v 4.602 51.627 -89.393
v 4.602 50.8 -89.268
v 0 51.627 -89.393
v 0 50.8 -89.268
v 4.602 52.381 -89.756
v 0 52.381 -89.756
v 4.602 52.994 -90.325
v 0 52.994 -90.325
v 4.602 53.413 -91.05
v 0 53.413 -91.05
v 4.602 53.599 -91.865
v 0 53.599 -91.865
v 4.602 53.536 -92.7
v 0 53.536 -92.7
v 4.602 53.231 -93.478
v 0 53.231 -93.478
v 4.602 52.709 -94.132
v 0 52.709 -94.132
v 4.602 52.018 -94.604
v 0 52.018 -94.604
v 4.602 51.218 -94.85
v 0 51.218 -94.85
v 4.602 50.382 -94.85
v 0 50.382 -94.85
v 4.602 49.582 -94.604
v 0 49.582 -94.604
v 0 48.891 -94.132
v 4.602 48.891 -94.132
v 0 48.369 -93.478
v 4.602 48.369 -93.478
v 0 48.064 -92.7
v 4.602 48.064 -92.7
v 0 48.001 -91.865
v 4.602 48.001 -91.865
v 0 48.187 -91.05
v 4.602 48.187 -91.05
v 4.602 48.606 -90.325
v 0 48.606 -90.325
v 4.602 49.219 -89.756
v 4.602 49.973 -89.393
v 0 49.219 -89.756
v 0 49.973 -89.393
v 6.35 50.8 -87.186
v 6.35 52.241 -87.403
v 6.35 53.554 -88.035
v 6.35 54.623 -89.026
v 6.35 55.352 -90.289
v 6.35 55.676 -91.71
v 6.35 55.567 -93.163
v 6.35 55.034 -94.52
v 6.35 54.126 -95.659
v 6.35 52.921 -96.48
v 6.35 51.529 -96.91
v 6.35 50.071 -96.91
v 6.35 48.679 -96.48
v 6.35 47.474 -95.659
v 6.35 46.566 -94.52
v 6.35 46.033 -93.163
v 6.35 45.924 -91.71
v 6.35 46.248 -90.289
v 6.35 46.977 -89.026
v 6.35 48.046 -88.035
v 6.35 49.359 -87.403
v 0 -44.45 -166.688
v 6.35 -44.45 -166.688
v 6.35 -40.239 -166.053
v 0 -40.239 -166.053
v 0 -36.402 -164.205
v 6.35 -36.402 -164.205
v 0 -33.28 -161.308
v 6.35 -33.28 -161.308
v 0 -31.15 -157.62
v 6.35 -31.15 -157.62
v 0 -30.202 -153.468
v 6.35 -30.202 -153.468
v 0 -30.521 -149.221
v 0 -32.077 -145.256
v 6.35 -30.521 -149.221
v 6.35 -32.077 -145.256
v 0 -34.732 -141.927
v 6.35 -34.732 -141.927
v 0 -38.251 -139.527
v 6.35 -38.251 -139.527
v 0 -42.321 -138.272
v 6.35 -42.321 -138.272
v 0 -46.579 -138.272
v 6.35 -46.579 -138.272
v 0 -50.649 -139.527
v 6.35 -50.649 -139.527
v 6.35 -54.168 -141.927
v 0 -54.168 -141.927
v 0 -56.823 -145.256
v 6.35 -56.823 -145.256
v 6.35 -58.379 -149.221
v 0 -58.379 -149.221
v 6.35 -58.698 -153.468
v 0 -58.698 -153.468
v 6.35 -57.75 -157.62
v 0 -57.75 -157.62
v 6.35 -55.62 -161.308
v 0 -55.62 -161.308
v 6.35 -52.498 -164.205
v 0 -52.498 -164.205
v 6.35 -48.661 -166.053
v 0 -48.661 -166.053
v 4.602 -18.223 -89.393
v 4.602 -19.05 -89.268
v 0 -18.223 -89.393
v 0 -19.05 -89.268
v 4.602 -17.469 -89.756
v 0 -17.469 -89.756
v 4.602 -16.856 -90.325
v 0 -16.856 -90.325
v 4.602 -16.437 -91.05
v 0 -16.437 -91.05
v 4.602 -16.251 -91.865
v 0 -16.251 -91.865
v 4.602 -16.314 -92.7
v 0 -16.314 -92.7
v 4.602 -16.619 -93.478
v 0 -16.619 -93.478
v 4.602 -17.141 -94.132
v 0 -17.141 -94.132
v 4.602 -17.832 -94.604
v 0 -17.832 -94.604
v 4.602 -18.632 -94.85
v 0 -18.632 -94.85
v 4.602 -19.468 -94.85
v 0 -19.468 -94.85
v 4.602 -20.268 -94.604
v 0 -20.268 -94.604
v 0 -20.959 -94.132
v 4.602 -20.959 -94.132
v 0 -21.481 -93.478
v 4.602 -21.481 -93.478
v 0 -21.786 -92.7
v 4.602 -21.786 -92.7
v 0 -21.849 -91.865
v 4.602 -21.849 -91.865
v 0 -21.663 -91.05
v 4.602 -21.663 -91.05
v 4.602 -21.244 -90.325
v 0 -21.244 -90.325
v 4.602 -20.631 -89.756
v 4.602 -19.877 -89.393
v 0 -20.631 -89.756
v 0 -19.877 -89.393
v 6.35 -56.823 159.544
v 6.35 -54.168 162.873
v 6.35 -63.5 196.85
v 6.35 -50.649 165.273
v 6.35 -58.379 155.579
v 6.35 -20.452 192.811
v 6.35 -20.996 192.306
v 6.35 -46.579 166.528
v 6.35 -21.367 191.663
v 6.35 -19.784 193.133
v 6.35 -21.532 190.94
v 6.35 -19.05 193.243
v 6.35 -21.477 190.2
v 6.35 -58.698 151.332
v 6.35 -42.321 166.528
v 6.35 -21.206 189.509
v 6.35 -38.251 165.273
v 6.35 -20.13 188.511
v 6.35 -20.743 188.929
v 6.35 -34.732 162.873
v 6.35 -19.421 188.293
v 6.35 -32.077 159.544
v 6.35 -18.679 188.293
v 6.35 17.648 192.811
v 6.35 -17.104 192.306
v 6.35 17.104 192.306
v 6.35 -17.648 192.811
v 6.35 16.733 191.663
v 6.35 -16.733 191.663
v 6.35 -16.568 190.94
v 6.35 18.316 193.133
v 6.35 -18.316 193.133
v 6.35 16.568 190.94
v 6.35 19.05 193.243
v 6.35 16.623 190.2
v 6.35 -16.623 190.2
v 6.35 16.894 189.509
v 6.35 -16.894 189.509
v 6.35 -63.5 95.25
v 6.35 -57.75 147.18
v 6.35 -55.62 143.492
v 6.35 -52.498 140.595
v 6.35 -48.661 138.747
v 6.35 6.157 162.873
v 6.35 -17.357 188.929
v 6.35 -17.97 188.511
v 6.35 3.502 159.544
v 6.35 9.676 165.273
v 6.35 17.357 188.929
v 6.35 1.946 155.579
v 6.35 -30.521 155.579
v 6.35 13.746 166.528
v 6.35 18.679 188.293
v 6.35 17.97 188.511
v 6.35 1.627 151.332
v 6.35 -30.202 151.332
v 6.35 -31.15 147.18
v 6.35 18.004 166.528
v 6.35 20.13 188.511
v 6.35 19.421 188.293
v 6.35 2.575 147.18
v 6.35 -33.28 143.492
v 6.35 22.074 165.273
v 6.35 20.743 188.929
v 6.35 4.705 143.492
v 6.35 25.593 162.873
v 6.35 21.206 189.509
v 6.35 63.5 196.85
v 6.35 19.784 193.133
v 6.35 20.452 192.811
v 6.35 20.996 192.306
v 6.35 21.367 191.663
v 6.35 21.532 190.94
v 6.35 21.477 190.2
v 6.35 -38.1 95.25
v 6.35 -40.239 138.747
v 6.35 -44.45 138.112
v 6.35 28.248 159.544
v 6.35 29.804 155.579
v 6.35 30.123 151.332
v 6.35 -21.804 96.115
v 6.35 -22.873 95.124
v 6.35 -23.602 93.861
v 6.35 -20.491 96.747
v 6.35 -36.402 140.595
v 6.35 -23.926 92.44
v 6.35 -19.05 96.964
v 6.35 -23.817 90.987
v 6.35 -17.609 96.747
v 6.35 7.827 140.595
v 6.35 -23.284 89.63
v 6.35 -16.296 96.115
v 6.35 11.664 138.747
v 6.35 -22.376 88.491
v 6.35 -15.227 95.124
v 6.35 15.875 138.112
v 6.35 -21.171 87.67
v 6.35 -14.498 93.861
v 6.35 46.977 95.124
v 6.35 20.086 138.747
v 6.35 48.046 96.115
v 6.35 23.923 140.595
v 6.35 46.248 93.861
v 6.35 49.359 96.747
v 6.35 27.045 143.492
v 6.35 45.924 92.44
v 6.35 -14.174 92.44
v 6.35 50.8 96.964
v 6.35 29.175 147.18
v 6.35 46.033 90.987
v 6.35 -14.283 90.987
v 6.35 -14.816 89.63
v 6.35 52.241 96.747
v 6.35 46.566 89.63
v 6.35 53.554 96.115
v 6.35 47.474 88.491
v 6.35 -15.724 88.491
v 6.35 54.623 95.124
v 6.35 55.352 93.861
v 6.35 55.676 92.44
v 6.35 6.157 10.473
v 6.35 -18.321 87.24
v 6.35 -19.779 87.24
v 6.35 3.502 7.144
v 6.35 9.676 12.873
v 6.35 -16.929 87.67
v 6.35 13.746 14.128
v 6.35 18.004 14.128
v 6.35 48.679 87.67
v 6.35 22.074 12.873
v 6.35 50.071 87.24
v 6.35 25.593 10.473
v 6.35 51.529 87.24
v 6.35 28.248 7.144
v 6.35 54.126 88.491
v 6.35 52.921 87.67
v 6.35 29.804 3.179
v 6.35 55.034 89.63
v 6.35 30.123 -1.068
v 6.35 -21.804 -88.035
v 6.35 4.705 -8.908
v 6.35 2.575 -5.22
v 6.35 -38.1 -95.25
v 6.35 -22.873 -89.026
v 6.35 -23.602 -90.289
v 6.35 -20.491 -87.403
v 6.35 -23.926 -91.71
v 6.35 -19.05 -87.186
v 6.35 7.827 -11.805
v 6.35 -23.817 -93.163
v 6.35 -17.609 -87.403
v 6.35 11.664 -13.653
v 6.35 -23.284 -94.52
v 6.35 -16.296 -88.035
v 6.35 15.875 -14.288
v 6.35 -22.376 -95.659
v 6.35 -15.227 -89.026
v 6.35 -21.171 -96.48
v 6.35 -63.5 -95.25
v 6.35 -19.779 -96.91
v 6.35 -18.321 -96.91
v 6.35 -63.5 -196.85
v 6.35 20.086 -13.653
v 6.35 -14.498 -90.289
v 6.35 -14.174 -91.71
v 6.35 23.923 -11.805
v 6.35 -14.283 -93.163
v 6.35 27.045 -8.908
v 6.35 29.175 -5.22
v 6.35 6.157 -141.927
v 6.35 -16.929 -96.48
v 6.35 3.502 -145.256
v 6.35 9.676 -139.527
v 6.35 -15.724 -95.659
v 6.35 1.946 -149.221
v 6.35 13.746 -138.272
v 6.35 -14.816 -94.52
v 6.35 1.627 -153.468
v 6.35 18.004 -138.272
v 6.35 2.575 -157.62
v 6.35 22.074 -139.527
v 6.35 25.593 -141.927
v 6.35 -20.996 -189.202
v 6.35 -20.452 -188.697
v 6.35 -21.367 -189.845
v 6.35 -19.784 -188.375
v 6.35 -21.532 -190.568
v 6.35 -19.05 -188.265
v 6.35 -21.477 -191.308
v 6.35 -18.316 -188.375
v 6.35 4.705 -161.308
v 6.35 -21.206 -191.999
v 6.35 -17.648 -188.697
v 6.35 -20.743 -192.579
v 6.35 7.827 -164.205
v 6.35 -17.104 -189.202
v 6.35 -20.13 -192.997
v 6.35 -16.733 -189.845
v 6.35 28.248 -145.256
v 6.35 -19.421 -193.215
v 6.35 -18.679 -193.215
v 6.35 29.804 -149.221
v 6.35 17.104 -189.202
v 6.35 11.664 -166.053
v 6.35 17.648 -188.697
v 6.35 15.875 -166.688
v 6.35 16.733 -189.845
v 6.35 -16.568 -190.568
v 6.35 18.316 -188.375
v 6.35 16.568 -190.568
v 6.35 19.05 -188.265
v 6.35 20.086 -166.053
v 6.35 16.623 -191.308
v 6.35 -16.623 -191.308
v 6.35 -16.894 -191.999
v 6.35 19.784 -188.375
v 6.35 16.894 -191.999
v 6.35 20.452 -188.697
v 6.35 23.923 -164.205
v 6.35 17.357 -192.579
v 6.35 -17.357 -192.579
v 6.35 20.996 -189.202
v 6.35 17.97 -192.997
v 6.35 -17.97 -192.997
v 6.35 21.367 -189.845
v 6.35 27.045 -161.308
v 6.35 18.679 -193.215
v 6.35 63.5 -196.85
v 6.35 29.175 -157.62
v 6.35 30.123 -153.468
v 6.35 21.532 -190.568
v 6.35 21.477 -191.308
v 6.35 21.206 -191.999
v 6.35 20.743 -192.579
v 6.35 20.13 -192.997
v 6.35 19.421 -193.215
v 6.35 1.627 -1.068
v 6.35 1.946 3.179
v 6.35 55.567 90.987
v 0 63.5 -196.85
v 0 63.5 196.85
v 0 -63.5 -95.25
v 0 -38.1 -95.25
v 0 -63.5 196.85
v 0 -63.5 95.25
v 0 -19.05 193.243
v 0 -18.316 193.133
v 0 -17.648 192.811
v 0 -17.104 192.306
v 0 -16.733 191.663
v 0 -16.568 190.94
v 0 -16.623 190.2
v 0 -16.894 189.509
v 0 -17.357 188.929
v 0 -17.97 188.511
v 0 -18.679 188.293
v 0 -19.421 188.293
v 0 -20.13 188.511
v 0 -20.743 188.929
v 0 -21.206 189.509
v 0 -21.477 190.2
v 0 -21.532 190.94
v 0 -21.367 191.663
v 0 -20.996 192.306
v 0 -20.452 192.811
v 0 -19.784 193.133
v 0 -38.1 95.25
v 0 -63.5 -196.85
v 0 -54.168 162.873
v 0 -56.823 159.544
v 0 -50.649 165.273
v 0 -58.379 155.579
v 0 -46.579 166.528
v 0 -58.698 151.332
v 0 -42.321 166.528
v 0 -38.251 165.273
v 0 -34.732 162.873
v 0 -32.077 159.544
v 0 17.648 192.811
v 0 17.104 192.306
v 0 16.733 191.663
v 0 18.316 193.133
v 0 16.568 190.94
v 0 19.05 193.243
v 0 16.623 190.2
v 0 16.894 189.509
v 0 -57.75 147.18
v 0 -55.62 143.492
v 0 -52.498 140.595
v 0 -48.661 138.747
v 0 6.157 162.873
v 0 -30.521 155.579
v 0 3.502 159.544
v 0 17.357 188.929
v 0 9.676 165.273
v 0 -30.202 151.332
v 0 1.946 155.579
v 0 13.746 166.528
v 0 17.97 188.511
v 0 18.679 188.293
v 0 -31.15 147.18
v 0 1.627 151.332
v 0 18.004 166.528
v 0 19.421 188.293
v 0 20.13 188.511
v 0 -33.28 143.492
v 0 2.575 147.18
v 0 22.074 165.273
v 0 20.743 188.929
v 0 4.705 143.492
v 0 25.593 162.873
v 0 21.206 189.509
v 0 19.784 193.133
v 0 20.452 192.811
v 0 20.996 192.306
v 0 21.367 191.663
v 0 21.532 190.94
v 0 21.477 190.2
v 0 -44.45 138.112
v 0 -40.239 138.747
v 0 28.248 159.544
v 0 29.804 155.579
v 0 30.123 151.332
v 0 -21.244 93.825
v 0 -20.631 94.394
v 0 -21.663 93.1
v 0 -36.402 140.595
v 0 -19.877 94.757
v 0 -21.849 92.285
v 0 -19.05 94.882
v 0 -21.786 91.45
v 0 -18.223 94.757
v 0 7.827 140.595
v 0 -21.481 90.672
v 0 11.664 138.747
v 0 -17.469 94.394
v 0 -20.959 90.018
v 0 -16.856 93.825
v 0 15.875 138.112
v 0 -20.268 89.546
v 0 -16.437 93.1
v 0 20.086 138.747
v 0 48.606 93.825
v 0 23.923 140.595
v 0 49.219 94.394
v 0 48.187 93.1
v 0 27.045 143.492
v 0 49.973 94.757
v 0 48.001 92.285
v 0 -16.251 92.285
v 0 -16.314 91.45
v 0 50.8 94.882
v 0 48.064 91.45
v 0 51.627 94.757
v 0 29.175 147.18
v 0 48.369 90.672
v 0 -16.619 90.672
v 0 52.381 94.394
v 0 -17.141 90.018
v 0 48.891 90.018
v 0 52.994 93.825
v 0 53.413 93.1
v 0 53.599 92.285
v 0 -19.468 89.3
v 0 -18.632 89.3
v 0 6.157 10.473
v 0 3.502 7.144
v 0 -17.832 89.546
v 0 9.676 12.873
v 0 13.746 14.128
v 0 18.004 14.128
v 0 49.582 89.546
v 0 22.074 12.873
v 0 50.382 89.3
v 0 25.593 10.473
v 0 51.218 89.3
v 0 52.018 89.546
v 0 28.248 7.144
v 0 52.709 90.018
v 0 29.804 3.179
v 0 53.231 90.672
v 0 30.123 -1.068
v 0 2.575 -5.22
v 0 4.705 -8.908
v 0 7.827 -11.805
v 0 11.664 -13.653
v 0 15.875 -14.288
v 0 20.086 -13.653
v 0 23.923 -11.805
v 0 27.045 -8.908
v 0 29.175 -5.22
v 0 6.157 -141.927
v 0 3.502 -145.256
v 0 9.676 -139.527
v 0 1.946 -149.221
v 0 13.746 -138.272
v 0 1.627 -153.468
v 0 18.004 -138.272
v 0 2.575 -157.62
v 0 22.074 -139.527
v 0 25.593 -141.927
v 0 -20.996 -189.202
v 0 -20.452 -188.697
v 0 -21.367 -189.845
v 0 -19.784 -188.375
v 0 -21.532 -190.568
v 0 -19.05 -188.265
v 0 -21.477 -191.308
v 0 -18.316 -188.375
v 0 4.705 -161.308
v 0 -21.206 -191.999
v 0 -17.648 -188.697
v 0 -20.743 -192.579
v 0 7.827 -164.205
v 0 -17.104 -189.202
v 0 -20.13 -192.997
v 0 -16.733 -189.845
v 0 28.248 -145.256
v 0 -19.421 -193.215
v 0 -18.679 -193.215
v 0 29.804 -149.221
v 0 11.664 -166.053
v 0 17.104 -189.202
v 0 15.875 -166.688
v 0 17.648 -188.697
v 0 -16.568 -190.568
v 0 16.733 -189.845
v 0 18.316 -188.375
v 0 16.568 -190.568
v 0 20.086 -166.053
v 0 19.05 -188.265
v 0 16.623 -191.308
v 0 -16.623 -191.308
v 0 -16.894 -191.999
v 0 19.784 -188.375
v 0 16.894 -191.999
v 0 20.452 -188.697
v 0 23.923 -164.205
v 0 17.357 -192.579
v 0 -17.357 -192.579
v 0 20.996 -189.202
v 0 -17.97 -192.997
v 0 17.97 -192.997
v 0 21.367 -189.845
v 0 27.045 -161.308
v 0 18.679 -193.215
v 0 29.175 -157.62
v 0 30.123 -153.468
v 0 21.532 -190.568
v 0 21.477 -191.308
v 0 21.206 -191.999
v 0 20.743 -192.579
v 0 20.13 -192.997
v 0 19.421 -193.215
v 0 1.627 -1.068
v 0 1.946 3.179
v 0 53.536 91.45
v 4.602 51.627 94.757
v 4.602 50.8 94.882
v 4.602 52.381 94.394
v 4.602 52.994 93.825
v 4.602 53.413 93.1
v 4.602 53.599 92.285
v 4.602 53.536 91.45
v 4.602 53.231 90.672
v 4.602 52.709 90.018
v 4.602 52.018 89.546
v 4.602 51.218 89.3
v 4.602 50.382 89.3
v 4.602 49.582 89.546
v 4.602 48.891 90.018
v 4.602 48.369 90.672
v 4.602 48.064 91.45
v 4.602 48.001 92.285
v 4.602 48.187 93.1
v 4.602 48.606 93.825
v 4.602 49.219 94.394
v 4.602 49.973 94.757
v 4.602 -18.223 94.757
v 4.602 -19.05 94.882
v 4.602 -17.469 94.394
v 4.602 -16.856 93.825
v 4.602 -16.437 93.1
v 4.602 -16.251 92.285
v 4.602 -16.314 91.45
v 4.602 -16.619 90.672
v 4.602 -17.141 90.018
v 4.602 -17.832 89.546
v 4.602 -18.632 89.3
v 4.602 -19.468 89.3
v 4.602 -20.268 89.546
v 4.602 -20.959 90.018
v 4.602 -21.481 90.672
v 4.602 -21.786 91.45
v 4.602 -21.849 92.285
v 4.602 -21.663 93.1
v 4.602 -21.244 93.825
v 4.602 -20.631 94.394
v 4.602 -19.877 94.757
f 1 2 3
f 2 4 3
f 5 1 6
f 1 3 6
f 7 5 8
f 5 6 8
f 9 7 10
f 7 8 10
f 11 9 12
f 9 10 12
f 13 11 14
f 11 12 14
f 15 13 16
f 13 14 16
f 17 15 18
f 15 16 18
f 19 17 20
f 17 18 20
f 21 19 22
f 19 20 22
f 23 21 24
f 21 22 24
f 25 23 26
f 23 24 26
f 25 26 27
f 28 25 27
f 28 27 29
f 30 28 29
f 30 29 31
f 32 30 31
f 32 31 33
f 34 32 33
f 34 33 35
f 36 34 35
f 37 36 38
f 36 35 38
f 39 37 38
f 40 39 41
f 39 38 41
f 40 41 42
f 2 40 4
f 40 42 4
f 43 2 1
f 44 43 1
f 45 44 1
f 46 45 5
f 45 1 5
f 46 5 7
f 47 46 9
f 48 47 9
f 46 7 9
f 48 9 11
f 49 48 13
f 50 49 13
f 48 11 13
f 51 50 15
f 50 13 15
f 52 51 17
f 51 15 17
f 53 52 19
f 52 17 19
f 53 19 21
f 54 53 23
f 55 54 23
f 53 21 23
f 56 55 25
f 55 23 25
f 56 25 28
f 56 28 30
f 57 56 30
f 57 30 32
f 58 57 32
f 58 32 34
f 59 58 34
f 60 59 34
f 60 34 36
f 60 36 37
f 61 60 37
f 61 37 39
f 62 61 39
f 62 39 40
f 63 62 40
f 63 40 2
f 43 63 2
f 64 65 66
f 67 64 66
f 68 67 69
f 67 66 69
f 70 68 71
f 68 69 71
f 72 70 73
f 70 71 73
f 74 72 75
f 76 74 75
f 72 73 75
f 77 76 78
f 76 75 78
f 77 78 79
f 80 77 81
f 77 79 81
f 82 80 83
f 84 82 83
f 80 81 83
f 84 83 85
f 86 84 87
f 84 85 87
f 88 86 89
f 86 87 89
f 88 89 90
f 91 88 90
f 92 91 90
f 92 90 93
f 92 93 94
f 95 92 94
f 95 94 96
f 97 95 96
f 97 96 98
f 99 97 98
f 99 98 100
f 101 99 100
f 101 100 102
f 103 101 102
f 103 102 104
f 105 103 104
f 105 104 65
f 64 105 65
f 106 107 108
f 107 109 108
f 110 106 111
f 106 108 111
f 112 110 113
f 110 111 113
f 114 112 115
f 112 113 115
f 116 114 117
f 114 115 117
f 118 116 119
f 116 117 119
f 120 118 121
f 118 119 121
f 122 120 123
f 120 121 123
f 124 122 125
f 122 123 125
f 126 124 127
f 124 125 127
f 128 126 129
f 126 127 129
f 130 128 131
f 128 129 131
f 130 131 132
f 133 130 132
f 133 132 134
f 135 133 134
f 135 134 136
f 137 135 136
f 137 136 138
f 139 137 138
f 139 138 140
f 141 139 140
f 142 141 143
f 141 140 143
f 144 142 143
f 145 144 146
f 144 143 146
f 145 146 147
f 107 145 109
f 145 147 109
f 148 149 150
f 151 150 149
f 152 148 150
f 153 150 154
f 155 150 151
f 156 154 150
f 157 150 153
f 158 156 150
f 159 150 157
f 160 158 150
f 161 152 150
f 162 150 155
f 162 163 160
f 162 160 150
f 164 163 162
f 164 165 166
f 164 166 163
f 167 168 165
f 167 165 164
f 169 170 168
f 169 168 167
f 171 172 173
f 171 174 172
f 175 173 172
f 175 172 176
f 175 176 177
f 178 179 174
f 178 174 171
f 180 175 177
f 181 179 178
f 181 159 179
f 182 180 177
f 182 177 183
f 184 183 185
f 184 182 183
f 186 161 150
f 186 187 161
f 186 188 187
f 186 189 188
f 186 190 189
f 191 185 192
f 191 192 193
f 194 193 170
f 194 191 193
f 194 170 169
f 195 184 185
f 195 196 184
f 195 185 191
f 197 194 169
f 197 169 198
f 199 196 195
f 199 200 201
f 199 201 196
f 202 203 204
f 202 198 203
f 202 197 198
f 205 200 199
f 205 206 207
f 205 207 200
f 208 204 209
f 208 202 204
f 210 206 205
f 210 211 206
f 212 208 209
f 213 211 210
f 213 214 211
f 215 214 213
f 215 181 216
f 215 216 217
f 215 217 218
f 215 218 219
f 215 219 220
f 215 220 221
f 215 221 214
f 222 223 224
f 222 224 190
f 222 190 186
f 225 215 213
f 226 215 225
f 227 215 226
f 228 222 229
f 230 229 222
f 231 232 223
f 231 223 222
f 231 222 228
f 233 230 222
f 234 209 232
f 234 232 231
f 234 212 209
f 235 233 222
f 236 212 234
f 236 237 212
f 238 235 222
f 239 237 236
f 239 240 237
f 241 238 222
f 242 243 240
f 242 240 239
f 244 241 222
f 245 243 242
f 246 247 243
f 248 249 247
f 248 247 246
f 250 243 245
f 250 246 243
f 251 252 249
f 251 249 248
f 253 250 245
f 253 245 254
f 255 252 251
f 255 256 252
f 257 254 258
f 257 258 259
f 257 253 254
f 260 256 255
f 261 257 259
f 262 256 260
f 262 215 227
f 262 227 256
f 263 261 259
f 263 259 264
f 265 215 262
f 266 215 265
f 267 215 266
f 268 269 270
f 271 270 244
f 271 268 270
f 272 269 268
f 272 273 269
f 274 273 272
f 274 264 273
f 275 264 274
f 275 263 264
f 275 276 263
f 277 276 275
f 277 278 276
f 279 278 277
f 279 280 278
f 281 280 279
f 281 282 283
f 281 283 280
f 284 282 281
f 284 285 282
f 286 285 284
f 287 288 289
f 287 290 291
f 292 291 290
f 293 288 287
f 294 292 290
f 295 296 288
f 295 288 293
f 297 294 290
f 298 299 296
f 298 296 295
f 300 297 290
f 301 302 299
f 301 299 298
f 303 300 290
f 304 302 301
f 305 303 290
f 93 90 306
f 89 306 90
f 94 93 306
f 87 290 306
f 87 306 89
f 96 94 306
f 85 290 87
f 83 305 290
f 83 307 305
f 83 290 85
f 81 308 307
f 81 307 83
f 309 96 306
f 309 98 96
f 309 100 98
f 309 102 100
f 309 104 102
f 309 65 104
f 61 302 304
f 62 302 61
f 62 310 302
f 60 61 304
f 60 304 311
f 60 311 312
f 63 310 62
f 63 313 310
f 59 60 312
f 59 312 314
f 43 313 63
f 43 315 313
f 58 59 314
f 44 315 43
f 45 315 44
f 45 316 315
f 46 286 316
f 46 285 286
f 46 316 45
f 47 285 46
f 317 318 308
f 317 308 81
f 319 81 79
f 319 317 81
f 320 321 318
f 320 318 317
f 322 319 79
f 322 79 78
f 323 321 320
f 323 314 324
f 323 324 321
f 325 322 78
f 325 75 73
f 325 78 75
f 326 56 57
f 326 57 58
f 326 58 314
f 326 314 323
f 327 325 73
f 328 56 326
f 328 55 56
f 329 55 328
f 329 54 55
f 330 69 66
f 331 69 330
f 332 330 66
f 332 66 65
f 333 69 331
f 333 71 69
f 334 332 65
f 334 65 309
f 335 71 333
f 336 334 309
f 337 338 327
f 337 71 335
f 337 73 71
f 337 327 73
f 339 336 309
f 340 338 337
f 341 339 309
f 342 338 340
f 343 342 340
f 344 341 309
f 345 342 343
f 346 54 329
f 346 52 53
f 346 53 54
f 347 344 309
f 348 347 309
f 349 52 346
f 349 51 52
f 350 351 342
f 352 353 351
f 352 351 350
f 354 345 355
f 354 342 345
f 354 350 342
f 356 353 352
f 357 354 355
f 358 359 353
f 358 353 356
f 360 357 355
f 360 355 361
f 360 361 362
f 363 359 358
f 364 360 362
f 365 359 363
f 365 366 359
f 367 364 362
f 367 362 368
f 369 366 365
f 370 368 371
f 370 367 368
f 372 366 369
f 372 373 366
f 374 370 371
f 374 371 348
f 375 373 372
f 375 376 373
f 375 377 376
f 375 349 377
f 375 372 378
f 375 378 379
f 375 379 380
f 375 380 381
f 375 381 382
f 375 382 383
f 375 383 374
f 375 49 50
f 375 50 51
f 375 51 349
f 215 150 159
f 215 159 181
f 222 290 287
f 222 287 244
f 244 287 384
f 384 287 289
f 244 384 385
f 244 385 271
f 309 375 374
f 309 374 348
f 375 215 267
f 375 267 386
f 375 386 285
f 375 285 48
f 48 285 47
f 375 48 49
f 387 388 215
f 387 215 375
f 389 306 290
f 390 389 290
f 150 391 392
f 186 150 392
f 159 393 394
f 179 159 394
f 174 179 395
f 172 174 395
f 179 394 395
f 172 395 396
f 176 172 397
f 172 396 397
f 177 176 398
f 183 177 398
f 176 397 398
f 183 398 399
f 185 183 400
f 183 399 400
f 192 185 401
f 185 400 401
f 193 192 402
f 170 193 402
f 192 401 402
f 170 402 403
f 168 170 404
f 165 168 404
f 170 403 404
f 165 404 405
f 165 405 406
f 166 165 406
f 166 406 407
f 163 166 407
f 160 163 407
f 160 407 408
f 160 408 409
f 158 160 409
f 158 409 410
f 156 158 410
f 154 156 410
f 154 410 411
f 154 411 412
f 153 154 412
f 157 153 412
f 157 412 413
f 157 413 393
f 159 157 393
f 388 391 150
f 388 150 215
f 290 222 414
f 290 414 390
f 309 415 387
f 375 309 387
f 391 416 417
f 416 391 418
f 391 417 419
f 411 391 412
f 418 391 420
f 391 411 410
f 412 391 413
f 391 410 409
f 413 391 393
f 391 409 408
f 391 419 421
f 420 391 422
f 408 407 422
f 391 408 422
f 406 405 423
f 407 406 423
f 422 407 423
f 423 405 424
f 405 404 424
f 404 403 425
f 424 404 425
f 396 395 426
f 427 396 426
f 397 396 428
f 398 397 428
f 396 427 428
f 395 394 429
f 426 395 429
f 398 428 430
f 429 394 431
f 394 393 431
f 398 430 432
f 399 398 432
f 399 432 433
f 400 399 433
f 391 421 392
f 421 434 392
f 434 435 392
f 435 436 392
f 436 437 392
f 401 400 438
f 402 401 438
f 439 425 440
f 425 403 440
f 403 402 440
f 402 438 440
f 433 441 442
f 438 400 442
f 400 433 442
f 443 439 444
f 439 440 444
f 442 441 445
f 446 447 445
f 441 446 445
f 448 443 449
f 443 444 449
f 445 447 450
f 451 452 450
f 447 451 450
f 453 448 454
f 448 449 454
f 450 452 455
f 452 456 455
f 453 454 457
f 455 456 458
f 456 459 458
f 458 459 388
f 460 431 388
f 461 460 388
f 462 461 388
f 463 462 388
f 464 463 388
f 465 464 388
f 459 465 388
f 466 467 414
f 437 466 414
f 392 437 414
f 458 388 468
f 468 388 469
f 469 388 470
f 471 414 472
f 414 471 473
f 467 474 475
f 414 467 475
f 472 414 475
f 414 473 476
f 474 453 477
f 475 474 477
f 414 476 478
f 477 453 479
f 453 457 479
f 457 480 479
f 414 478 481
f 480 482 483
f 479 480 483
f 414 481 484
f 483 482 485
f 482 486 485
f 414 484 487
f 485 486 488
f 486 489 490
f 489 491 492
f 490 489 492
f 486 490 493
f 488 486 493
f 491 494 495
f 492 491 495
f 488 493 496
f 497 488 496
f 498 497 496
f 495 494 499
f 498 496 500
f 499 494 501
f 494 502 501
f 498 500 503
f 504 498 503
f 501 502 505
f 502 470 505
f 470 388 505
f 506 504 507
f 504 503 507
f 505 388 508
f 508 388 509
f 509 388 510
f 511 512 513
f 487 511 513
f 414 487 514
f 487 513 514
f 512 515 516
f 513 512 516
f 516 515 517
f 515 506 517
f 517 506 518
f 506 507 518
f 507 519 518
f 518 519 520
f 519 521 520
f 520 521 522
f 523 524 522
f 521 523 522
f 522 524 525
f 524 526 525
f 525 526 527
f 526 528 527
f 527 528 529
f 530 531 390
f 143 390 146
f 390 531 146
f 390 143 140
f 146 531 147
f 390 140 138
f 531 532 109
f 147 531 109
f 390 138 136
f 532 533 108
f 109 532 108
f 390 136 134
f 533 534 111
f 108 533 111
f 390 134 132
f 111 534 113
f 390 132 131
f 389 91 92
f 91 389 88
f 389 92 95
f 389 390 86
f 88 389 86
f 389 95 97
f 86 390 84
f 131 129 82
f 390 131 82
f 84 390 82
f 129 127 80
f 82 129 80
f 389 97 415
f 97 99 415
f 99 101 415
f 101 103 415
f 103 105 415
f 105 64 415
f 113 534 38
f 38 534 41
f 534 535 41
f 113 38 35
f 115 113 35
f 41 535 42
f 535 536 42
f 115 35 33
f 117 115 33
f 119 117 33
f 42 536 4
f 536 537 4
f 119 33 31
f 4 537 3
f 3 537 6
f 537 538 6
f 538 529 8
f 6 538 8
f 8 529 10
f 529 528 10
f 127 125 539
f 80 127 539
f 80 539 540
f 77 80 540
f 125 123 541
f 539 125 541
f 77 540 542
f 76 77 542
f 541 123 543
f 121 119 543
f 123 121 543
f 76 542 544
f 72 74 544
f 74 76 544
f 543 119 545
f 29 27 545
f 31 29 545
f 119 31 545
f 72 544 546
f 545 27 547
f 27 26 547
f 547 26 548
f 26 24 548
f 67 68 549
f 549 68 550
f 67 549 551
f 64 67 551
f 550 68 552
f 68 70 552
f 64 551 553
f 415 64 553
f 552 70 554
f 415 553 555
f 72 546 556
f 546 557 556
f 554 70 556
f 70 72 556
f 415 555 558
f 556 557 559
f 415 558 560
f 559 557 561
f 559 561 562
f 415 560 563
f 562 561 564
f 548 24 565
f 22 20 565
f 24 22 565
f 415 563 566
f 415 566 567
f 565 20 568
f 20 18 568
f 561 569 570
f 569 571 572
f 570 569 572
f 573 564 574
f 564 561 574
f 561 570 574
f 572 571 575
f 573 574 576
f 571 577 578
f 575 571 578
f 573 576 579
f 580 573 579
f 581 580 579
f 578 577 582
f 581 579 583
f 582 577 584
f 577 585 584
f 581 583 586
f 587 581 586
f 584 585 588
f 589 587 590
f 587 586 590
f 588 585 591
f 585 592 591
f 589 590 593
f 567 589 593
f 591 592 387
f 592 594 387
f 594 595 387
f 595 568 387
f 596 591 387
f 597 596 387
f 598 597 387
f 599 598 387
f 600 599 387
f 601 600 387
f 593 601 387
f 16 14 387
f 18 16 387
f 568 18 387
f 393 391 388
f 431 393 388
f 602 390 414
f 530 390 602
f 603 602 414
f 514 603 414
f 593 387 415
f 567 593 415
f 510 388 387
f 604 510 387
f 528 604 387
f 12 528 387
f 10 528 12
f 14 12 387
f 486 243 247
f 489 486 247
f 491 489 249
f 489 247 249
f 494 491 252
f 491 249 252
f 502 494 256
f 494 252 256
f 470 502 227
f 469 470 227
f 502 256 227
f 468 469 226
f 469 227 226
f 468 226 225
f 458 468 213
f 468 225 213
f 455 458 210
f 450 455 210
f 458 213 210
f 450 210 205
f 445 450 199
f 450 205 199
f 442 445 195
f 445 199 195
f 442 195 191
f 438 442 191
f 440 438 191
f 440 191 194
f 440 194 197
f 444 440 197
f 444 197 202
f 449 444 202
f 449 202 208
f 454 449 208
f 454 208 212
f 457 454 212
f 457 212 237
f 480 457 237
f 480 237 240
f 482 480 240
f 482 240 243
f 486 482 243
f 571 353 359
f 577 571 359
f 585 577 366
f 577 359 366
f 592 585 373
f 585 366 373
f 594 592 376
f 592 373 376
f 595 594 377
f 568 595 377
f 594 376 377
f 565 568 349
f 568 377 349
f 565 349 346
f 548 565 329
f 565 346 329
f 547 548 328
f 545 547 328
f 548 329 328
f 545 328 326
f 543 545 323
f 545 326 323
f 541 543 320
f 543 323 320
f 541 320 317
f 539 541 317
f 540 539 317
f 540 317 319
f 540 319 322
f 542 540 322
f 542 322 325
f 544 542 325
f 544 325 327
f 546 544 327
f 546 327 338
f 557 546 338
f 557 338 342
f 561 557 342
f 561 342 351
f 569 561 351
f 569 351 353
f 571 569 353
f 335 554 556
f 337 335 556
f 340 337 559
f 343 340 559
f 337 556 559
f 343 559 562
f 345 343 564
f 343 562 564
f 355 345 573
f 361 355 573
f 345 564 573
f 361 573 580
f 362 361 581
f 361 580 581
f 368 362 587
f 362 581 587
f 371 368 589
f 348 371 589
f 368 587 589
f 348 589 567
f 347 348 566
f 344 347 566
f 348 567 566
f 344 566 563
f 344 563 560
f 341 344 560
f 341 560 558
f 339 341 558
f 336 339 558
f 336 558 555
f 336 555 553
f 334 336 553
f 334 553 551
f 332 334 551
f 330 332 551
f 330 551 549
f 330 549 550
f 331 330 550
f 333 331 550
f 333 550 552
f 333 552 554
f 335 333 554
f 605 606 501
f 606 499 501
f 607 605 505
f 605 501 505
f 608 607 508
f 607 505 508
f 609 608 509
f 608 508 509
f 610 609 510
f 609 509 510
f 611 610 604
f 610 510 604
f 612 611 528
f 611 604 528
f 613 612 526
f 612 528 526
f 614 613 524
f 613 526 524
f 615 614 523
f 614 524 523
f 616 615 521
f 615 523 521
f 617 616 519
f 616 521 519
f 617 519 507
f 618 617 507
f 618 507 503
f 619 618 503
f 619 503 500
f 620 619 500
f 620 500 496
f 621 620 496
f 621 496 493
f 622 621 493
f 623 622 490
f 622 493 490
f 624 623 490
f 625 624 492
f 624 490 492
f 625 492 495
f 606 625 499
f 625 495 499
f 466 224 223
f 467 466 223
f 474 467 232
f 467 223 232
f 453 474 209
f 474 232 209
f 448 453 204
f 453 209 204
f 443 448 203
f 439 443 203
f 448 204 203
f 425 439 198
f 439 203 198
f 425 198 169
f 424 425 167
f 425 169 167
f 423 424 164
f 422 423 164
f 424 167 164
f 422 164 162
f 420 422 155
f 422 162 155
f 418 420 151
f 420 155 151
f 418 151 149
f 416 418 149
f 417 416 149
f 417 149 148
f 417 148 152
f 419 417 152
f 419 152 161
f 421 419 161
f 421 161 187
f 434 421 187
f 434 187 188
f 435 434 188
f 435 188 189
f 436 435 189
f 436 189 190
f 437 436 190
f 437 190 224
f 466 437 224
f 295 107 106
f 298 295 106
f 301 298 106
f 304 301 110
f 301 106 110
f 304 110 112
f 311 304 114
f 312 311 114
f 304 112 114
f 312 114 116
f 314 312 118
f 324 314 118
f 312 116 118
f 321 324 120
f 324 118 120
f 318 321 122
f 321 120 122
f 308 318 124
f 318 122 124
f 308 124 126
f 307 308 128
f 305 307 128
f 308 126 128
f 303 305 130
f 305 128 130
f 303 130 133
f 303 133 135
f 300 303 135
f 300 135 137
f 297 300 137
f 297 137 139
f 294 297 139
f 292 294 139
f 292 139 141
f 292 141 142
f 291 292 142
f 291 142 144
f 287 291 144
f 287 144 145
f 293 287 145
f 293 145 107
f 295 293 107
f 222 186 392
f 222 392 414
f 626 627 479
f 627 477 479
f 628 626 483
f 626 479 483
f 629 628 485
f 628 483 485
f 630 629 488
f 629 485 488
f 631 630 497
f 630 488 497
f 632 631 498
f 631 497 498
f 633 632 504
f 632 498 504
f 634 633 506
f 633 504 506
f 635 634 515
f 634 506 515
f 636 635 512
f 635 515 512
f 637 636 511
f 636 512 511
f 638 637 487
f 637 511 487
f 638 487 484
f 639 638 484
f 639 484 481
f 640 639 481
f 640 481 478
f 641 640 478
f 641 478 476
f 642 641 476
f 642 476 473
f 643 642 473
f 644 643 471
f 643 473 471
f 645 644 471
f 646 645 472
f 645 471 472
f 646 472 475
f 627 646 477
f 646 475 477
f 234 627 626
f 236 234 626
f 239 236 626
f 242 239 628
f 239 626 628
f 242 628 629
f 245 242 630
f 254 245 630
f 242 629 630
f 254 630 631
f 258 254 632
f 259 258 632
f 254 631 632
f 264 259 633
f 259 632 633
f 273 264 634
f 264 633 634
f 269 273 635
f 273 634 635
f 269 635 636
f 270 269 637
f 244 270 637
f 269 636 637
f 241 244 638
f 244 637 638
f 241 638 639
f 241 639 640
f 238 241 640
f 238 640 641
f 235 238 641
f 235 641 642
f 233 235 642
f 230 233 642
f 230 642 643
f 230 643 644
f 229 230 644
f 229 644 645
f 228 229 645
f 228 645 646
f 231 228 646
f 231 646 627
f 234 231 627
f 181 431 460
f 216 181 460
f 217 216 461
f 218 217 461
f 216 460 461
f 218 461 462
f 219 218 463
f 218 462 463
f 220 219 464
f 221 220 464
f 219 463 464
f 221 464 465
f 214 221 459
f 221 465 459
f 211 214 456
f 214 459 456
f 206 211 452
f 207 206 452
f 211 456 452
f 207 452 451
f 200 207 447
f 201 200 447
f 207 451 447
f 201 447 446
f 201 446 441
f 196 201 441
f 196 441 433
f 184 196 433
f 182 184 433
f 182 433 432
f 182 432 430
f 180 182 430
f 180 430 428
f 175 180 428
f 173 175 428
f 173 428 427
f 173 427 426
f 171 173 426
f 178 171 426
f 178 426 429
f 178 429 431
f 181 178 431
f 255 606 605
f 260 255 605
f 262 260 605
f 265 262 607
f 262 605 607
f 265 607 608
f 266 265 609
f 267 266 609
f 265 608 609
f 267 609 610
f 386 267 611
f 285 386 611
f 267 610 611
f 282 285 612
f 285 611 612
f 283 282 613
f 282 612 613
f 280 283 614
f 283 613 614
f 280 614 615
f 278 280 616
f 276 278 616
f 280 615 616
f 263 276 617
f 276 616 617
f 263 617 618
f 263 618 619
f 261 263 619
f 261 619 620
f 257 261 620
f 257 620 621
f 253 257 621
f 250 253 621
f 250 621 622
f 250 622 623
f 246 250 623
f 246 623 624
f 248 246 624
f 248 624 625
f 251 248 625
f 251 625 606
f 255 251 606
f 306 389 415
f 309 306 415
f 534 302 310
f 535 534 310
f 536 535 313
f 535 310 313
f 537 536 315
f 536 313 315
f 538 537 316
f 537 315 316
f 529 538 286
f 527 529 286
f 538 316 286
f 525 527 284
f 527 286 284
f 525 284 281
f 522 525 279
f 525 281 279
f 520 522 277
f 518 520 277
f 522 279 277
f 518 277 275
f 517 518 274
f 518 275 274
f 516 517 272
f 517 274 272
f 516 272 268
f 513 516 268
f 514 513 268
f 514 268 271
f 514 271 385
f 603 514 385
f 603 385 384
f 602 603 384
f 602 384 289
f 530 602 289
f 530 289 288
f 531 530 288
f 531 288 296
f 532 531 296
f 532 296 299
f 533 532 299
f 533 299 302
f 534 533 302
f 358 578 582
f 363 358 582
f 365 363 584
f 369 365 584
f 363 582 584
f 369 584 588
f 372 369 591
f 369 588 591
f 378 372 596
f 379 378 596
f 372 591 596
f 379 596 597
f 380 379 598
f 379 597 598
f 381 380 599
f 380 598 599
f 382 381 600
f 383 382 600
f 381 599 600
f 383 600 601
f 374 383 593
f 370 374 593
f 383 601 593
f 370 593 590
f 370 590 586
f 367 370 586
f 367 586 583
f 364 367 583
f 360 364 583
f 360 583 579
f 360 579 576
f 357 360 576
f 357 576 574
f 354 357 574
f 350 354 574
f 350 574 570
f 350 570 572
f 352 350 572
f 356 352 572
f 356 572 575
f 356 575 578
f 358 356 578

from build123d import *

# Parameters (mm, degrees)
SKETCH1_W                                          = 393.7
SKETCH1_H                                          = 127
BOSS_EXTRUDE1_DEPTH                                = 6.35
SKETCH2_R                                          = 14.2875
CUT_EXTRUDE1_DEPTH                                 = 207.935968357
F_10_CLEARANCE_HOLE1_D                             = 4.9784
CSK_FOR_10_FLAT_HEAD_MACHINE_SCREW_100_D           = 5.6134
CSK_FOR_10_FLAT_HEAD_MACHINE_SCREW_100_CSINK_D     = 9.779
CSK_FOR_10_FLAT_HEAD_MACHINE_SCREW_100_CSINK_ANGLE = 100
SKETCH23_W                                         = 190.5
SKETCH23_H                                         = 25.4
CUT_EXTRUDE6_DEPTH                                 = 207.935968357


with BuildPart() as part:
    # Sketch1 → Boss-Extrude1 (new body)
    with BuildSketch(Plane(origin=(0, 0, 0), x_dir=(0, 0, -1), z_dir=(1, 0, 0))):
        Rectangle(SKETCH1_W, SKETCH1_H)
    extrude(amount=BOSS_EXTRUDE1_DEPTH)

    # Sketch2 → Cut-Extrude1 (cut, through all)
    with BuildSketch(Plane(origin=(6.35, 0, 0), x_dir=(0, 0, -1), z_dir=(1, 0, 0))):
        with Locations((0, 15.875)):
            Circle(SKETCH2_R)
        with Locations((-152.4, 15.875)):
            Circle(SKETCH2_R)
        with Locations((152.4, 15.875)):
            Circle(SKETCH2_R)
        with Locations((-152.4, -44.45)):
            Circle(SKETCH2_R)
        with Locations((152.4, -44.45)):
            Circle(SKETCH2_R)
    extrude(amount=-CUT_EXTRUDE1_DEPTH, mode=Mode.SUBTRACT)

    # #10 Clearance Hole1 (through all)
    with Locations(Plane(origin=(6.35, 0, 0), x_dir=(0, 0, -1), z_dir=(1, 0, 0))):
        with Locations((-190.754, 19.05), (-190.754, -19.05), (190.754, 19.05), (190.754, -19.05)):
            Hole(F_10_CLEARANCE_HOLE1_D / 2)

    # CSK for #10 Flat Head Machine Screw (100)1 (through all)
    with Locations(Plane(origin=(6.35, 0, 0), x_dir=(0, 0, -1), z_dir=(1, 0, 0))):
        with Locations((-92.075, 50.8), (92.075, 50.8), (-92.075, -19.05), (92.075, -19.05)):
            CounterSinkHole(CSK_FOR_10_FLAT_HEAD_MACHINE_SCREW_100_D / 2, CSK_FOR_10_FLAT_HEAD_MACHINE_SCREW_100_CSINK_D / 2, counter_sink_angle=CSK_FOR_10_FLAT_HEAD_MACHINE_SCREW_100_CSINK_ANGLE)

    # Sketch23 → Cut-Extrude6 (cut, through all)
    with BuildSketch(Plane(origin=(6.35, 0, 0), x_dir=(0, 0, -1), z_dir=(1, 0, 0))):
        with Locations((0, -50.8)):
            Rectangle(SKETCH23_W, SKETCH23_H)
    extrude(amount=-CUT_EXTRUDE6_DEPTH, mode=Mode.SUBTRACT)


solid = part.part
